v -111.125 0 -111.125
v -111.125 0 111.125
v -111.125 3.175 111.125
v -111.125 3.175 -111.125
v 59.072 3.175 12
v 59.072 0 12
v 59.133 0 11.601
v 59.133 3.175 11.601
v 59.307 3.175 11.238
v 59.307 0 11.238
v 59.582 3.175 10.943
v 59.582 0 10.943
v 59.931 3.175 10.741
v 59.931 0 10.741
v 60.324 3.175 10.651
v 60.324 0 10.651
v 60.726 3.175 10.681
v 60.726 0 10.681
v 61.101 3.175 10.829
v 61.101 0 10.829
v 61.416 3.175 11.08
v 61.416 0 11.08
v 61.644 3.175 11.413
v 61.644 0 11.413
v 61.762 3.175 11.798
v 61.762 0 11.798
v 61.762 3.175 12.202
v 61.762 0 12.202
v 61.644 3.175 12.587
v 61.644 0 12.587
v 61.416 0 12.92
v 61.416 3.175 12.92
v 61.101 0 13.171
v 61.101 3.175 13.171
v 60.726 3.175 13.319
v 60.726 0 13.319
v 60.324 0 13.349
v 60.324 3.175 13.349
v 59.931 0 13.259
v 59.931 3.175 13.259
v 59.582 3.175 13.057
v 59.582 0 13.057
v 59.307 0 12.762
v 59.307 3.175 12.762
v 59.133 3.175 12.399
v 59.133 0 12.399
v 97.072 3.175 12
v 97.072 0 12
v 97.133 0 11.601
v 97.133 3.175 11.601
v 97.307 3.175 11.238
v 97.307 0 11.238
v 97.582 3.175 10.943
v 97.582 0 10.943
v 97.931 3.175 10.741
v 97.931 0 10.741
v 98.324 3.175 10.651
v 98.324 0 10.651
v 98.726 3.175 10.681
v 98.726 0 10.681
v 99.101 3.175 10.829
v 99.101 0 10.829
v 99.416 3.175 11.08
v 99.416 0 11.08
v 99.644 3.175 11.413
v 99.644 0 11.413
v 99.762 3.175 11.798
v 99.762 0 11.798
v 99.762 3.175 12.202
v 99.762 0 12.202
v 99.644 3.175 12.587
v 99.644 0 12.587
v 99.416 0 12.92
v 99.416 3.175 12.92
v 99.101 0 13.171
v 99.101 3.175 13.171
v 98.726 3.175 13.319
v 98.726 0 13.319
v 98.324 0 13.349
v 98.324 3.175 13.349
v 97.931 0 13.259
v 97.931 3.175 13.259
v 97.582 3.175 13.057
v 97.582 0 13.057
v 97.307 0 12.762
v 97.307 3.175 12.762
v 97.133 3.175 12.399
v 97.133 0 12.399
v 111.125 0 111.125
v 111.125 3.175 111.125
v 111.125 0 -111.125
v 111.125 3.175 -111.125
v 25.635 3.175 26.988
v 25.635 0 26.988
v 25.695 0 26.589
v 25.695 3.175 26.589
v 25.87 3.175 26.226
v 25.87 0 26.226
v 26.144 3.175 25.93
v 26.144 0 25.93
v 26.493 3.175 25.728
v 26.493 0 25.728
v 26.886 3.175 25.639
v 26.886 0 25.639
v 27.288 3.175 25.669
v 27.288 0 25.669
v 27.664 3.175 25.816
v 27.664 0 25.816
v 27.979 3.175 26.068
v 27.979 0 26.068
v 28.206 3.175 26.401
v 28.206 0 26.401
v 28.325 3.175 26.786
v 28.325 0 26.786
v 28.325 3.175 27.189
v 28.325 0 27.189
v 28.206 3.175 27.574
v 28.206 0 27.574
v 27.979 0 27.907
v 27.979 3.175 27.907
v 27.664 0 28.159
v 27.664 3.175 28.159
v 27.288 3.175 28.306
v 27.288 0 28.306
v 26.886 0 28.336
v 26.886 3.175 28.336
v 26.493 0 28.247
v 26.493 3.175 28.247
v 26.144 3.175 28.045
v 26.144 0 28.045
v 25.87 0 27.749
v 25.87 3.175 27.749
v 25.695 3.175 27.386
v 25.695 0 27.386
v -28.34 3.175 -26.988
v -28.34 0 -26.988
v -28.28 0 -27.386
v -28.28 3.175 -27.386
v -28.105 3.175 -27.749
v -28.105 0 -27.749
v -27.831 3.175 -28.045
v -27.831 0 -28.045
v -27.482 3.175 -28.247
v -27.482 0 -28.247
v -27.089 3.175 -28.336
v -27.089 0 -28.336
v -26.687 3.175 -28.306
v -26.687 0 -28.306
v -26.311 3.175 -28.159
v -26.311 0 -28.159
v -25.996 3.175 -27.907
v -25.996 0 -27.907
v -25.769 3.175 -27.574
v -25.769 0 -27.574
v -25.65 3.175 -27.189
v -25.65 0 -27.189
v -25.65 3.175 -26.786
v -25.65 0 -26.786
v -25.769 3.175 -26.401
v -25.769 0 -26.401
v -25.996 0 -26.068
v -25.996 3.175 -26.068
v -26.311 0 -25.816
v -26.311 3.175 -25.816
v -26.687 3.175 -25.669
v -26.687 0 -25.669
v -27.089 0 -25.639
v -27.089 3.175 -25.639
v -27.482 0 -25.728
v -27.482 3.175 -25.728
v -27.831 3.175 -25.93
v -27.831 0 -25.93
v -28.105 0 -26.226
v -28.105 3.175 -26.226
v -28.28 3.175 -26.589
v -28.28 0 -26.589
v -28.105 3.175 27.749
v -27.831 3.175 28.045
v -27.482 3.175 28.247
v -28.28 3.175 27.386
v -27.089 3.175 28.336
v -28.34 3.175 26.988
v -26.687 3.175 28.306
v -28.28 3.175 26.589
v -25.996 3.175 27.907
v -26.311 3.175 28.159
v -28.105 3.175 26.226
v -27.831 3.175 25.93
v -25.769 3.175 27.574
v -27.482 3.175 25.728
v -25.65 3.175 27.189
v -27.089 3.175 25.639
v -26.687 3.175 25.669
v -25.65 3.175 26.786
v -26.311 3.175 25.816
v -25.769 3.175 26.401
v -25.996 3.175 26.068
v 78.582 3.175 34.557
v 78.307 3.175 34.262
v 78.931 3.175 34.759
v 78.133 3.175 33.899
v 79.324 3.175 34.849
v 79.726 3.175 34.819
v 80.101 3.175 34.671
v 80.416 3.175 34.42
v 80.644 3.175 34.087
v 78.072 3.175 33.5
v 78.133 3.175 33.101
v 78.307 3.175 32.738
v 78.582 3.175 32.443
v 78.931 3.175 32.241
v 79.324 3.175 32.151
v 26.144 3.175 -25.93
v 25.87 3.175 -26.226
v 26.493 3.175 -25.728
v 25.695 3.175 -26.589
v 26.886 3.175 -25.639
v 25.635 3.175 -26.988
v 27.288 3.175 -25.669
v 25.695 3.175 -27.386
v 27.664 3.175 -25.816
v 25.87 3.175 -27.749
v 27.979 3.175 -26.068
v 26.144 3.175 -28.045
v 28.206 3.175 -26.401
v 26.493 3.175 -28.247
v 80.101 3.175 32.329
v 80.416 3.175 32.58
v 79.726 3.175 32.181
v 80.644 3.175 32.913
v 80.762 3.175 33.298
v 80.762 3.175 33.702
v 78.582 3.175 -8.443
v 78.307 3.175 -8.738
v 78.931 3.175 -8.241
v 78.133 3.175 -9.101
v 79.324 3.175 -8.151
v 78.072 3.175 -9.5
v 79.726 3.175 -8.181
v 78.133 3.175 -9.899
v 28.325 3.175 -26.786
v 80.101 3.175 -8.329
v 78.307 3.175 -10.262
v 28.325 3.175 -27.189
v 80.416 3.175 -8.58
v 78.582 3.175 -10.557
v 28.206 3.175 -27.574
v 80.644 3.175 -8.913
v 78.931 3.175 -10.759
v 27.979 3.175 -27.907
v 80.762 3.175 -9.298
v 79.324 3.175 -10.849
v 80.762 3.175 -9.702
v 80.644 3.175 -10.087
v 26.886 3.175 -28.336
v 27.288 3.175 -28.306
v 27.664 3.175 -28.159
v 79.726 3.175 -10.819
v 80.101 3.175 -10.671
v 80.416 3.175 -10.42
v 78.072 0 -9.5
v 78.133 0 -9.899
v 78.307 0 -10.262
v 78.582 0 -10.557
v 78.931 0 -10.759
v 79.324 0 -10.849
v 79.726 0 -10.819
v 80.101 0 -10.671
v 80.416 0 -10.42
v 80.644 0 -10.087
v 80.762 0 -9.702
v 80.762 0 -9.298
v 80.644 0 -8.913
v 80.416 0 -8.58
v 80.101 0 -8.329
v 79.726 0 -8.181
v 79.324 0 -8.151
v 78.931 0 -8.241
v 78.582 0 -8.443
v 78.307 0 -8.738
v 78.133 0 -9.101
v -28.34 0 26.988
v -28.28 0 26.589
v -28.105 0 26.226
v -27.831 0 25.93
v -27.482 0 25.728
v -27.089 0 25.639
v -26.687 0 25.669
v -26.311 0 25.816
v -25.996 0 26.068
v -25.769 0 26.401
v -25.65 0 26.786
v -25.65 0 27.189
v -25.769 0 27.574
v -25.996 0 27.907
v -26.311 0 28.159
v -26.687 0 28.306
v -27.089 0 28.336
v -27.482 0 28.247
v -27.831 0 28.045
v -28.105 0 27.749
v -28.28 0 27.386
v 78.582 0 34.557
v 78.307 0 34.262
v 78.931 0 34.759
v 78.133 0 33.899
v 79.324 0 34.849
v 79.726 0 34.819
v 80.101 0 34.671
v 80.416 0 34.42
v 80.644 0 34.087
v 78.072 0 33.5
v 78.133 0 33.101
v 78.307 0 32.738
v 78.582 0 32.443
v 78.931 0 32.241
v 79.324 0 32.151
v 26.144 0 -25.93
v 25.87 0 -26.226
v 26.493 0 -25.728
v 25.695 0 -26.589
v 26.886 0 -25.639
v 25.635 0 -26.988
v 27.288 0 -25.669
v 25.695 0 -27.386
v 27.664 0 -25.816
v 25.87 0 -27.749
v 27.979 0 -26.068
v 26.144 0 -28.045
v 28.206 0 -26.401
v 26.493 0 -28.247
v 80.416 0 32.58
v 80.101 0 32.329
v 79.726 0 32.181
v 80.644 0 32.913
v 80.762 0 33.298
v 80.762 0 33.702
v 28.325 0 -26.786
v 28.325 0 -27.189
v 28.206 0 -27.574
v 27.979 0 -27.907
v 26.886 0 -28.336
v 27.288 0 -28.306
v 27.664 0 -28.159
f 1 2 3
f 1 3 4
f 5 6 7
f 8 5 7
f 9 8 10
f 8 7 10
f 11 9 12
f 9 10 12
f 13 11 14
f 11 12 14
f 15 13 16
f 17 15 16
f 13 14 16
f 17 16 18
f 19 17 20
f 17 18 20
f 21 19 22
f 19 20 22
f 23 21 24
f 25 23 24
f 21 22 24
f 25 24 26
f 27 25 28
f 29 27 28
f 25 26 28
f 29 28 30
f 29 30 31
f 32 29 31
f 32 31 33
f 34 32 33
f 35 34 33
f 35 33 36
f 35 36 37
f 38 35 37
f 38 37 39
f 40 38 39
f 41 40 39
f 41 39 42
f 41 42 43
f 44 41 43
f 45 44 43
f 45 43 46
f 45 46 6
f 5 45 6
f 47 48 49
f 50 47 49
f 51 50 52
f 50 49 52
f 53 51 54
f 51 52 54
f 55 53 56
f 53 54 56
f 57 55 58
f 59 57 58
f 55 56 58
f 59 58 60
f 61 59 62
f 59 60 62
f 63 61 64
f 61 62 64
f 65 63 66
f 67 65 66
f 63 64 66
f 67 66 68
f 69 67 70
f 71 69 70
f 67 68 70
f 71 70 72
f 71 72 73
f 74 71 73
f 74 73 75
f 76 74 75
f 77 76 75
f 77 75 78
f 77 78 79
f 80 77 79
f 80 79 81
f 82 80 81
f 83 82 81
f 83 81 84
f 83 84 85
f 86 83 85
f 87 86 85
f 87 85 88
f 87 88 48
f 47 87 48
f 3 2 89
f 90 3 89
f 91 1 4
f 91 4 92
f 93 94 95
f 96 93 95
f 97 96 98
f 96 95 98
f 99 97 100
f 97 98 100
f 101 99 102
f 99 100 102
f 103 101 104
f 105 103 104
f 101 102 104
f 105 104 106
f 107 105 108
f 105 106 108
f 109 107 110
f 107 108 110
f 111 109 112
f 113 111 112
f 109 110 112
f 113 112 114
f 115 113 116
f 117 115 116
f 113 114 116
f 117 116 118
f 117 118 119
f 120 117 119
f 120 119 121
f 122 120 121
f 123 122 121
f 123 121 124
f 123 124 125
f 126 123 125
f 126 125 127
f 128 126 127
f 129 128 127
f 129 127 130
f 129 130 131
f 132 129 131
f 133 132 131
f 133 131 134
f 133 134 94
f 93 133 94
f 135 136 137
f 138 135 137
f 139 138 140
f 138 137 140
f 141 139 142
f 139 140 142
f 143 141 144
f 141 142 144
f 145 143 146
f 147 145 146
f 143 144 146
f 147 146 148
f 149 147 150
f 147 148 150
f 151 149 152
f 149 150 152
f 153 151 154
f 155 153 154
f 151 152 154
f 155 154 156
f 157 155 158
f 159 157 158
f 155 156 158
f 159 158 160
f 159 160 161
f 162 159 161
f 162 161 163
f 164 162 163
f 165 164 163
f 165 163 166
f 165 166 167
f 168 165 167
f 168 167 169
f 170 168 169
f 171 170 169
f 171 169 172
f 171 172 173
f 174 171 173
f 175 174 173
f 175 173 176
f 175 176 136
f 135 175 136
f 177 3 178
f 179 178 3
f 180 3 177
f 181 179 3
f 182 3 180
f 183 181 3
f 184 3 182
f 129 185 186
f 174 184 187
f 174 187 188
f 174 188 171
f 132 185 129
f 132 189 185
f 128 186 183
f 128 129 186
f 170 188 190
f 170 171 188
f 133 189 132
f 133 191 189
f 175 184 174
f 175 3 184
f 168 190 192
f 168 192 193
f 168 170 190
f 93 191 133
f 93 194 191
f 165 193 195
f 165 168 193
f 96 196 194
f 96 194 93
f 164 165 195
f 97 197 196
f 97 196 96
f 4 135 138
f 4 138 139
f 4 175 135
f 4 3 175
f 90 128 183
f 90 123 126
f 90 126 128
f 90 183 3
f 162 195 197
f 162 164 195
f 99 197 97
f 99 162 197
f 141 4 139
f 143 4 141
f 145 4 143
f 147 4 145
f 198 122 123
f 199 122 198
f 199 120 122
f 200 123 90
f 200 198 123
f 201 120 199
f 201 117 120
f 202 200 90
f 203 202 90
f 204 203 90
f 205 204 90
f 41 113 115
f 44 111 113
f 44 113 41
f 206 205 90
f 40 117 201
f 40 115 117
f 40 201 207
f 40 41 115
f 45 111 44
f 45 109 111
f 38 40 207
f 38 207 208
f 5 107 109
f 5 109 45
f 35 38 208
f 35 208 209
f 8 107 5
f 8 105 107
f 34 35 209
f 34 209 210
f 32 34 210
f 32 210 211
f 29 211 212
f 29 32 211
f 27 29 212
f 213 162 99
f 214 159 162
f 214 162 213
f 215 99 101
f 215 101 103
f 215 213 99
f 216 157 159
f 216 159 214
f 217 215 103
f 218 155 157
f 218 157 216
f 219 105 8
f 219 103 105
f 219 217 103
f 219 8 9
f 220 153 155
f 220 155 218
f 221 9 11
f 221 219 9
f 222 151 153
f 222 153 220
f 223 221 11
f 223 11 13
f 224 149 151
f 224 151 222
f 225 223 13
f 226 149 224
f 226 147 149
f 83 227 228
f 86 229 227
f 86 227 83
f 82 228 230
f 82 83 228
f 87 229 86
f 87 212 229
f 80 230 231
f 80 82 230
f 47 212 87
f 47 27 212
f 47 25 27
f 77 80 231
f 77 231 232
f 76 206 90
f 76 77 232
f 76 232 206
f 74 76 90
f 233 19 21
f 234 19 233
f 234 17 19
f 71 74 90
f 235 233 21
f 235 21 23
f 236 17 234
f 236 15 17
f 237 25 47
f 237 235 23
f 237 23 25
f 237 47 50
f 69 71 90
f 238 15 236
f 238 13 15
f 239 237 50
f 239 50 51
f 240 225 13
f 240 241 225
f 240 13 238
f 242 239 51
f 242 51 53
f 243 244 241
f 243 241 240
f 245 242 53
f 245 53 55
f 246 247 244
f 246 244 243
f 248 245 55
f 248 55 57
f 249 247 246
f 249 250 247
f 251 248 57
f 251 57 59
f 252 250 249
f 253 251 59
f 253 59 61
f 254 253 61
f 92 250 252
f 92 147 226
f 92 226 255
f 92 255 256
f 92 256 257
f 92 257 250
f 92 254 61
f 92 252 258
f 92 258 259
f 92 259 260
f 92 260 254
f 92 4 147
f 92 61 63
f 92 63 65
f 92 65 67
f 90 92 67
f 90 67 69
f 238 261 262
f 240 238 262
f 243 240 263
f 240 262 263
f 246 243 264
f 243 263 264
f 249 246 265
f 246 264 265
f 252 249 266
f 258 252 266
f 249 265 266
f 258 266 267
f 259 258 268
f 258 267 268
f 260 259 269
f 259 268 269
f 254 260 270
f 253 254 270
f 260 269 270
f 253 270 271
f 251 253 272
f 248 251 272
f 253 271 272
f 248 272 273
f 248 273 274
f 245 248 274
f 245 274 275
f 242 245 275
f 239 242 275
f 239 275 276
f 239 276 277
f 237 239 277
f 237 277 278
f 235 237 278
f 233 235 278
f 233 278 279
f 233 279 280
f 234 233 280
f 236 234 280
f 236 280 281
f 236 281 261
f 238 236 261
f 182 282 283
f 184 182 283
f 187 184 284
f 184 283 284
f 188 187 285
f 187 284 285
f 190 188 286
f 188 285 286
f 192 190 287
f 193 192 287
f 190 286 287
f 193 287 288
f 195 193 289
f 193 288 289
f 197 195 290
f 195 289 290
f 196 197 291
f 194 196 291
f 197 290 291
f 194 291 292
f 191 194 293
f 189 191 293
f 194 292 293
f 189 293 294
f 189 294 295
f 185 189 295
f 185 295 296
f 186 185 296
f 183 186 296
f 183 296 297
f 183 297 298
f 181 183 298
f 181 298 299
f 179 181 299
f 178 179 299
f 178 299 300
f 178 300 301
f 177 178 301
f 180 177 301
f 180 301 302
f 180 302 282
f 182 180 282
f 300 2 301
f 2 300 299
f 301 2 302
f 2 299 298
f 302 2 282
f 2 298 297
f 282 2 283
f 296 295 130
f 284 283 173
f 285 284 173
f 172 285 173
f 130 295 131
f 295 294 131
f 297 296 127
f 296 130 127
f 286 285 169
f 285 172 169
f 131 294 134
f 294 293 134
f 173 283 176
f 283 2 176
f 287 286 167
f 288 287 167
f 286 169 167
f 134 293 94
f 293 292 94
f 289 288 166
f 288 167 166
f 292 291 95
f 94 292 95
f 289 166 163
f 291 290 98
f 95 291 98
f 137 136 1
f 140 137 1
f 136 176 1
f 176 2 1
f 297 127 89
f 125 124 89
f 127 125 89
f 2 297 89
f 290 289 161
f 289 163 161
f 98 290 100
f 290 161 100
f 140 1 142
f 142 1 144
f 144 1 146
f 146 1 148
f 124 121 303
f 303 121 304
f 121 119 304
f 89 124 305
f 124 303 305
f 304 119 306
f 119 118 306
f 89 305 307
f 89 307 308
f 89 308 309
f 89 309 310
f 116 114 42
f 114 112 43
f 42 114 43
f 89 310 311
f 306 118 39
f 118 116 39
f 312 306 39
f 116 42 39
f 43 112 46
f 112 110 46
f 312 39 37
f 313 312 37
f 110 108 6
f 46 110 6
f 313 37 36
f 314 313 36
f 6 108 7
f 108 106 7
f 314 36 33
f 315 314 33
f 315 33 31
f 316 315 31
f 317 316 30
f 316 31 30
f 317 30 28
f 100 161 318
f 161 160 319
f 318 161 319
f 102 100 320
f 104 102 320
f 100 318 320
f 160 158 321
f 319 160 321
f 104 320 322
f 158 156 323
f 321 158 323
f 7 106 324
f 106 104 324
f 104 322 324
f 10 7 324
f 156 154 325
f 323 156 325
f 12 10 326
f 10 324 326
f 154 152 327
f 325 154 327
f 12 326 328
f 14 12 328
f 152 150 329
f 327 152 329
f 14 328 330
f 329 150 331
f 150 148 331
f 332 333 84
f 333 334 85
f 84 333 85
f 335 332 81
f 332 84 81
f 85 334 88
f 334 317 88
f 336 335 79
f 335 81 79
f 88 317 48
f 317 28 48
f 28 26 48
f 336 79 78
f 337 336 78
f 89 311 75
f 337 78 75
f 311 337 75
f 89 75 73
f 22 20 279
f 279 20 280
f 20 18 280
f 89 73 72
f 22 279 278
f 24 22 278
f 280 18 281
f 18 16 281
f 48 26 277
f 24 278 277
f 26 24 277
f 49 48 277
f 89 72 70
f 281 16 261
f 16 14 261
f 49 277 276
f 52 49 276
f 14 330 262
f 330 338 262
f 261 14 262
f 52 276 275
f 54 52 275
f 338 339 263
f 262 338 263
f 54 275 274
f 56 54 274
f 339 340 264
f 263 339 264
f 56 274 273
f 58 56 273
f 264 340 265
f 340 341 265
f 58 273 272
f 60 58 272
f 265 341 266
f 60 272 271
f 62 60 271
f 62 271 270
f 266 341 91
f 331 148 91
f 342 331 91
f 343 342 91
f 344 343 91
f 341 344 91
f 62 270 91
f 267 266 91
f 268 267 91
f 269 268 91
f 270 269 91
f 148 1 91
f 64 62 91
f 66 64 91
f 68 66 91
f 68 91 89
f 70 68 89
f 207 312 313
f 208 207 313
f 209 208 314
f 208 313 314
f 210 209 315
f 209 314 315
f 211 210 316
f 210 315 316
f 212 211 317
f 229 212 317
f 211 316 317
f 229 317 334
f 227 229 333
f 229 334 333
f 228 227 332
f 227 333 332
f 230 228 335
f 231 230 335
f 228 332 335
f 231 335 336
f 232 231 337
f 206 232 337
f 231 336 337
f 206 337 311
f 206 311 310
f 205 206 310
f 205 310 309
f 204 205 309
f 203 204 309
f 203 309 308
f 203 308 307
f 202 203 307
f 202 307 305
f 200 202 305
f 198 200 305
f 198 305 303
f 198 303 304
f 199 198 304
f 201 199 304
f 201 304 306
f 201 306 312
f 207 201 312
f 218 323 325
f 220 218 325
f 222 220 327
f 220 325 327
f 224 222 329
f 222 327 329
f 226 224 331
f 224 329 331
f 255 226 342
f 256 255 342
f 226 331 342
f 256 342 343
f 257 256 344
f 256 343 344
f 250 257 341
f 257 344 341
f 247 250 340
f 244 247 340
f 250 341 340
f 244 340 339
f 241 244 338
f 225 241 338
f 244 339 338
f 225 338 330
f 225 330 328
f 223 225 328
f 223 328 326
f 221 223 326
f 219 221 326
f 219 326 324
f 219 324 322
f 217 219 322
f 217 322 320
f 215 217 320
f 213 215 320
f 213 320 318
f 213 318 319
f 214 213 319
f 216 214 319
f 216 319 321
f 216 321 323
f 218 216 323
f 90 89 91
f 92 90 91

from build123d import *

# Parameters (mm, degrees)
SKETCH1_W             = 222.25
SKETCH1_H             = 222.25
BOSS_EXTRUDE1_DEPTH   = 3.175
F_6_32_TAPPED_HOLE1_D = 2.7051
F_6_32_TAPPED_HOLE3_D = 2.7051


with BuildPart() as part:
    # Sketch1 → Boss-Extrude1 (new body)
    with BuildSketch(Plane(origin=(0, 0, 0), x_dir=(1, 0, 0), z_dir=(0, 1, 0))):
        Rectangle(SKETCH1_W, SKETCH1_H)
    extrude(amount=BOSS_EXTRUDE1_DEPTH)

    # #6-32 Tapped Hole1 (through all)
    with Locations(Plane(origin=(0, 3.175, 0), x_dir=(1, 0, 0), z_dir=(0, 1, 0))):
        with Locations((-26.9875, -26.9875), (-26.9875, 26.9875), (26.9875, 26.9875), (26.9875, -26.9875)):
            Hole(F_6_32_TAPPED_HOLE1_D / 2)

    # #6-32 Tapped Hole3 (through all)
    with Locations(Plane(origin=(0, 3.175, 0), x_dir=(1, 0, 0), z_dir=(0, 1, 0))):
        with Locations((60.425, -12), (79.425, -33.5), (98.425, -12), (79.425, 9.5)):
            Hole(F_6_32_TAPPED_HOLE3_D / 2)


solid = part.part
